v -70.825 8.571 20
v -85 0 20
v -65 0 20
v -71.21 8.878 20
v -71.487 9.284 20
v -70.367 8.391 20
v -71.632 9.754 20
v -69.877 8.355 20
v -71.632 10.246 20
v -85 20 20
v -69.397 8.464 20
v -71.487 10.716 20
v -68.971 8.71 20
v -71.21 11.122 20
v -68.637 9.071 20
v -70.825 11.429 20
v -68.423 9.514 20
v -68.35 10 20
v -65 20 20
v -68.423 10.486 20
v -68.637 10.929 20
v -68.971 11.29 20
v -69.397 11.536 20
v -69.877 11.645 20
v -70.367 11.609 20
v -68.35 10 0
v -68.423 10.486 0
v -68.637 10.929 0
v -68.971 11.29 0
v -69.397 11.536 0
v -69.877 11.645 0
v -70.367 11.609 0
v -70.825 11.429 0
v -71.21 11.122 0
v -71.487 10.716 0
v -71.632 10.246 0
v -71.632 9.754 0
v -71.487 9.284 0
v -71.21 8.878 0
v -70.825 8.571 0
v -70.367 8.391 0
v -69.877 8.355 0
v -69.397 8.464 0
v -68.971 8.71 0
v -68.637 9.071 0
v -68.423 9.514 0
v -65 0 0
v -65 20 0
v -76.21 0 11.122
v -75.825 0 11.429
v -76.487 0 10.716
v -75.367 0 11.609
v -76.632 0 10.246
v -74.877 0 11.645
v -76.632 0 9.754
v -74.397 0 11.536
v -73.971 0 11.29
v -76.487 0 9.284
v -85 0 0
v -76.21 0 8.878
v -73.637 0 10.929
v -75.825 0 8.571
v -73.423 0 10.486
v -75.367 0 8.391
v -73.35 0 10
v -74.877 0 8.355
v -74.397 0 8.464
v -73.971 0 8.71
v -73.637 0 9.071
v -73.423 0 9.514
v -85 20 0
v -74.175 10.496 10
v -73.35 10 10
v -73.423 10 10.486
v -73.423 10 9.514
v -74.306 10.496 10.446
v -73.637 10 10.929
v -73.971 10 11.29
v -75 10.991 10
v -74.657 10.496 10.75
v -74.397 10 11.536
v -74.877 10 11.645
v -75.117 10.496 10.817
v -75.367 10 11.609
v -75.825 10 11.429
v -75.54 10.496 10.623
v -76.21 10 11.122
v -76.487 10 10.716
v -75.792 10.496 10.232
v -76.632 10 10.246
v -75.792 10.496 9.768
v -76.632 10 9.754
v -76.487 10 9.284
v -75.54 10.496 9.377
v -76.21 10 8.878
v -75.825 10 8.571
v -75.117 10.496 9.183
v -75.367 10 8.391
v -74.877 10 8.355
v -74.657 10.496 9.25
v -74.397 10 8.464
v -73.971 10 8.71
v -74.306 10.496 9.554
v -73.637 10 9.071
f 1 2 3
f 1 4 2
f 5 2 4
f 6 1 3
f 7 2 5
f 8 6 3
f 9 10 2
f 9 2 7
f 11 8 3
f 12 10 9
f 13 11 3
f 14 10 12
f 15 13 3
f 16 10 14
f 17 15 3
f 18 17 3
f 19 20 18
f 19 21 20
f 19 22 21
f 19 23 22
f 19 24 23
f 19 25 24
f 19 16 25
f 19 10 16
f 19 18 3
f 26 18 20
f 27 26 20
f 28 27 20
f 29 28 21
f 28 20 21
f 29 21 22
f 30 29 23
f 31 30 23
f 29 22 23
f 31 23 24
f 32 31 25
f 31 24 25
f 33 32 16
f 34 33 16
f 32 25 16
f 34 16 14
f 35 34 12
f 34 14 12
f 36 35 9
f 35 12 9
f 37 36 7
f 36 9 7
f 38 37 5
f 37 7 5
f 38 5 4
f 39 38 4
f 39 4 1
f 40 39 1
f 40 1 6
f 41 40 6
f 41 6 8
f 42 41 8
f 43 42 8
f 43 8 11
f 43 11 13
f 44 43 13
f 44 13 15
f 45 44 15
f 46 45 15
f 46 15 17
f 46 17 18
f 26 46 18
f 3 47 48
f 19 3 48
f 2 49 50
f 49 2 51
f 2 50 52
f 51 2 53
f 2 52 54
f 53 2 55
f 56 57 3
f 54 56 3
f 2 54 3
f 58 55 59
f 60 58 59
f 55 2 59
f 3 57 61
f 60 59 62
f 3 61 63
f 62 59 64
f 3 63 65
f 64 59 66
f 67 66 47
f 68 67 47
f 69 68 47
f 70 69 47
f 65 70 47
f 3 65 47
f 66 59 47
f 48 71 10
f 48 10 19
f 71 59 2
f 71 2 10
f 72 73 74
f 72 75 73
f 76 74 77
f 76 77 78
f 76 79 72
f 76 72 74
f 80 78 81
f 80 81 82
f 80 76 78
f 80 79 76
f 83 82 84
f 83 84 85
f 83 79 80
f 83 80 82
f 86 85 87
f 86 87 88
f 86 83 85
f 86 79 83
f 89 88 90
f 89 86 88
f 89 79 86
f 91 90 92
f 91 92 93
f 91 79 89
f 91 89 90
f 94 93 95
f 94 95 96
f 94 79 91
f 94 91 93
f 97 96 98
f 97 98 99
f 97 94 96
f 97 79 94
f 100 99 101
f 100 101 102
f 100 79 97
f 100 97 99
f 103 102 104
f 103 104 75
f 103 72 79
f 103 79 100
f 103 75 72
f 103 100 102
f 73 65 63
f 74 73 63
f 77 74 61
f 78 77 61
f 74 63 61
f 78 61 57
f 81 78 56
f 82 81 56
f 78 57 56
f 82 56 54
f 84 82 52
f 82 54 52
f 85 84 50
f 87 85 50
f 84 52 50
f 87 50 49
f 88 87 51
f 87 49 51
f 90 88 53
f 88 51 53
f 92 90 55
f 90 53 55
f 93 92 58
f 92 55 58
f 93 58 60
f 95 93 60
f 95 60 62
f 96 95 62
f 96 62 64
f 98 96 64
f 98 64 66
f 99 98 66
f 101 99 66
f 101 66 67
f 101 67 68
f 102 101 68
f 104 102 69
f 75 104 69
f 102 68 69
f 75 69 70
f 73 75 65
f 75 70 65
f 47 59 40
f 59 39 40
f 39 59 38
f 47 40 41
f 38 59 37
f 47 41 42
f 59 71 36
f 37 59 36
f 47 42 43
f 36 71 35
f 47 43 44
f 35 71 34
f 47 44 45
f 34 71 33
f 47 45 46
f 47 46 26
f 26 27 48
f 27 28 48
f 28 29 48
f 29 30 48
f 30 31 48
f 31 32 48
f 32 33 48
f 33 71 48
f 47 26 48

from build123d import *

# Parameters (mm, degrees)
SKETCH_W      = 20
SKETCH_H      = 20
PAD_DEPTH     = 20
SKETCH001_R   = 1.65
HOLE_DEPTH    = 10
HOLE_TIPS_R   = 1.65
SKETCH002_R   = 1.65
HOLE001_DEPTH = 20.001


with BuildPart() as part:
    # Sketch → Pad (new body)
    with BuildSketch(Plane.XY):
        with Locations((-75, 10)):
            Rectangle(SKETCH_W, SKETCH_H)
    extrude(amount=PAD_DEPTH)

    # Sketch001 (on Face1 of Pad) → Hole (cut)
    with BuildSketch(Plane.XZ):
        with Locations((-75, 10)):
            Circle(SKETCH001_R)
    extrude(amount=-HOLE_DEPTH, mode=Mode.SUBTRACT)

    # Hole tips → Hole tip 1 section 0
    with BuildSketch(Plane.XZ.offset(-10), mode=Mode.PRIVATE) as hole_tip_1_s0:
        with Locations((-75, 10)):
            Circle(HOLE_TIPS_R)
    loft([hole_tip_1_s0.sketch, Vertex(-75, 10.99142, 10)], mode=Mode.SUBTRACT)

    # Sketch002 (on Face4 of Hole) → Hole001 (cut, through all)
    with BuildSketch(Plane.XY.offset(20)):
        with Locations((-70, 10)):
            Circle(SKETCH002_R)
    extrude(amount=-HOLE001_DEPTH, mode=Mode.SUBTRACT)


solid = part.part
